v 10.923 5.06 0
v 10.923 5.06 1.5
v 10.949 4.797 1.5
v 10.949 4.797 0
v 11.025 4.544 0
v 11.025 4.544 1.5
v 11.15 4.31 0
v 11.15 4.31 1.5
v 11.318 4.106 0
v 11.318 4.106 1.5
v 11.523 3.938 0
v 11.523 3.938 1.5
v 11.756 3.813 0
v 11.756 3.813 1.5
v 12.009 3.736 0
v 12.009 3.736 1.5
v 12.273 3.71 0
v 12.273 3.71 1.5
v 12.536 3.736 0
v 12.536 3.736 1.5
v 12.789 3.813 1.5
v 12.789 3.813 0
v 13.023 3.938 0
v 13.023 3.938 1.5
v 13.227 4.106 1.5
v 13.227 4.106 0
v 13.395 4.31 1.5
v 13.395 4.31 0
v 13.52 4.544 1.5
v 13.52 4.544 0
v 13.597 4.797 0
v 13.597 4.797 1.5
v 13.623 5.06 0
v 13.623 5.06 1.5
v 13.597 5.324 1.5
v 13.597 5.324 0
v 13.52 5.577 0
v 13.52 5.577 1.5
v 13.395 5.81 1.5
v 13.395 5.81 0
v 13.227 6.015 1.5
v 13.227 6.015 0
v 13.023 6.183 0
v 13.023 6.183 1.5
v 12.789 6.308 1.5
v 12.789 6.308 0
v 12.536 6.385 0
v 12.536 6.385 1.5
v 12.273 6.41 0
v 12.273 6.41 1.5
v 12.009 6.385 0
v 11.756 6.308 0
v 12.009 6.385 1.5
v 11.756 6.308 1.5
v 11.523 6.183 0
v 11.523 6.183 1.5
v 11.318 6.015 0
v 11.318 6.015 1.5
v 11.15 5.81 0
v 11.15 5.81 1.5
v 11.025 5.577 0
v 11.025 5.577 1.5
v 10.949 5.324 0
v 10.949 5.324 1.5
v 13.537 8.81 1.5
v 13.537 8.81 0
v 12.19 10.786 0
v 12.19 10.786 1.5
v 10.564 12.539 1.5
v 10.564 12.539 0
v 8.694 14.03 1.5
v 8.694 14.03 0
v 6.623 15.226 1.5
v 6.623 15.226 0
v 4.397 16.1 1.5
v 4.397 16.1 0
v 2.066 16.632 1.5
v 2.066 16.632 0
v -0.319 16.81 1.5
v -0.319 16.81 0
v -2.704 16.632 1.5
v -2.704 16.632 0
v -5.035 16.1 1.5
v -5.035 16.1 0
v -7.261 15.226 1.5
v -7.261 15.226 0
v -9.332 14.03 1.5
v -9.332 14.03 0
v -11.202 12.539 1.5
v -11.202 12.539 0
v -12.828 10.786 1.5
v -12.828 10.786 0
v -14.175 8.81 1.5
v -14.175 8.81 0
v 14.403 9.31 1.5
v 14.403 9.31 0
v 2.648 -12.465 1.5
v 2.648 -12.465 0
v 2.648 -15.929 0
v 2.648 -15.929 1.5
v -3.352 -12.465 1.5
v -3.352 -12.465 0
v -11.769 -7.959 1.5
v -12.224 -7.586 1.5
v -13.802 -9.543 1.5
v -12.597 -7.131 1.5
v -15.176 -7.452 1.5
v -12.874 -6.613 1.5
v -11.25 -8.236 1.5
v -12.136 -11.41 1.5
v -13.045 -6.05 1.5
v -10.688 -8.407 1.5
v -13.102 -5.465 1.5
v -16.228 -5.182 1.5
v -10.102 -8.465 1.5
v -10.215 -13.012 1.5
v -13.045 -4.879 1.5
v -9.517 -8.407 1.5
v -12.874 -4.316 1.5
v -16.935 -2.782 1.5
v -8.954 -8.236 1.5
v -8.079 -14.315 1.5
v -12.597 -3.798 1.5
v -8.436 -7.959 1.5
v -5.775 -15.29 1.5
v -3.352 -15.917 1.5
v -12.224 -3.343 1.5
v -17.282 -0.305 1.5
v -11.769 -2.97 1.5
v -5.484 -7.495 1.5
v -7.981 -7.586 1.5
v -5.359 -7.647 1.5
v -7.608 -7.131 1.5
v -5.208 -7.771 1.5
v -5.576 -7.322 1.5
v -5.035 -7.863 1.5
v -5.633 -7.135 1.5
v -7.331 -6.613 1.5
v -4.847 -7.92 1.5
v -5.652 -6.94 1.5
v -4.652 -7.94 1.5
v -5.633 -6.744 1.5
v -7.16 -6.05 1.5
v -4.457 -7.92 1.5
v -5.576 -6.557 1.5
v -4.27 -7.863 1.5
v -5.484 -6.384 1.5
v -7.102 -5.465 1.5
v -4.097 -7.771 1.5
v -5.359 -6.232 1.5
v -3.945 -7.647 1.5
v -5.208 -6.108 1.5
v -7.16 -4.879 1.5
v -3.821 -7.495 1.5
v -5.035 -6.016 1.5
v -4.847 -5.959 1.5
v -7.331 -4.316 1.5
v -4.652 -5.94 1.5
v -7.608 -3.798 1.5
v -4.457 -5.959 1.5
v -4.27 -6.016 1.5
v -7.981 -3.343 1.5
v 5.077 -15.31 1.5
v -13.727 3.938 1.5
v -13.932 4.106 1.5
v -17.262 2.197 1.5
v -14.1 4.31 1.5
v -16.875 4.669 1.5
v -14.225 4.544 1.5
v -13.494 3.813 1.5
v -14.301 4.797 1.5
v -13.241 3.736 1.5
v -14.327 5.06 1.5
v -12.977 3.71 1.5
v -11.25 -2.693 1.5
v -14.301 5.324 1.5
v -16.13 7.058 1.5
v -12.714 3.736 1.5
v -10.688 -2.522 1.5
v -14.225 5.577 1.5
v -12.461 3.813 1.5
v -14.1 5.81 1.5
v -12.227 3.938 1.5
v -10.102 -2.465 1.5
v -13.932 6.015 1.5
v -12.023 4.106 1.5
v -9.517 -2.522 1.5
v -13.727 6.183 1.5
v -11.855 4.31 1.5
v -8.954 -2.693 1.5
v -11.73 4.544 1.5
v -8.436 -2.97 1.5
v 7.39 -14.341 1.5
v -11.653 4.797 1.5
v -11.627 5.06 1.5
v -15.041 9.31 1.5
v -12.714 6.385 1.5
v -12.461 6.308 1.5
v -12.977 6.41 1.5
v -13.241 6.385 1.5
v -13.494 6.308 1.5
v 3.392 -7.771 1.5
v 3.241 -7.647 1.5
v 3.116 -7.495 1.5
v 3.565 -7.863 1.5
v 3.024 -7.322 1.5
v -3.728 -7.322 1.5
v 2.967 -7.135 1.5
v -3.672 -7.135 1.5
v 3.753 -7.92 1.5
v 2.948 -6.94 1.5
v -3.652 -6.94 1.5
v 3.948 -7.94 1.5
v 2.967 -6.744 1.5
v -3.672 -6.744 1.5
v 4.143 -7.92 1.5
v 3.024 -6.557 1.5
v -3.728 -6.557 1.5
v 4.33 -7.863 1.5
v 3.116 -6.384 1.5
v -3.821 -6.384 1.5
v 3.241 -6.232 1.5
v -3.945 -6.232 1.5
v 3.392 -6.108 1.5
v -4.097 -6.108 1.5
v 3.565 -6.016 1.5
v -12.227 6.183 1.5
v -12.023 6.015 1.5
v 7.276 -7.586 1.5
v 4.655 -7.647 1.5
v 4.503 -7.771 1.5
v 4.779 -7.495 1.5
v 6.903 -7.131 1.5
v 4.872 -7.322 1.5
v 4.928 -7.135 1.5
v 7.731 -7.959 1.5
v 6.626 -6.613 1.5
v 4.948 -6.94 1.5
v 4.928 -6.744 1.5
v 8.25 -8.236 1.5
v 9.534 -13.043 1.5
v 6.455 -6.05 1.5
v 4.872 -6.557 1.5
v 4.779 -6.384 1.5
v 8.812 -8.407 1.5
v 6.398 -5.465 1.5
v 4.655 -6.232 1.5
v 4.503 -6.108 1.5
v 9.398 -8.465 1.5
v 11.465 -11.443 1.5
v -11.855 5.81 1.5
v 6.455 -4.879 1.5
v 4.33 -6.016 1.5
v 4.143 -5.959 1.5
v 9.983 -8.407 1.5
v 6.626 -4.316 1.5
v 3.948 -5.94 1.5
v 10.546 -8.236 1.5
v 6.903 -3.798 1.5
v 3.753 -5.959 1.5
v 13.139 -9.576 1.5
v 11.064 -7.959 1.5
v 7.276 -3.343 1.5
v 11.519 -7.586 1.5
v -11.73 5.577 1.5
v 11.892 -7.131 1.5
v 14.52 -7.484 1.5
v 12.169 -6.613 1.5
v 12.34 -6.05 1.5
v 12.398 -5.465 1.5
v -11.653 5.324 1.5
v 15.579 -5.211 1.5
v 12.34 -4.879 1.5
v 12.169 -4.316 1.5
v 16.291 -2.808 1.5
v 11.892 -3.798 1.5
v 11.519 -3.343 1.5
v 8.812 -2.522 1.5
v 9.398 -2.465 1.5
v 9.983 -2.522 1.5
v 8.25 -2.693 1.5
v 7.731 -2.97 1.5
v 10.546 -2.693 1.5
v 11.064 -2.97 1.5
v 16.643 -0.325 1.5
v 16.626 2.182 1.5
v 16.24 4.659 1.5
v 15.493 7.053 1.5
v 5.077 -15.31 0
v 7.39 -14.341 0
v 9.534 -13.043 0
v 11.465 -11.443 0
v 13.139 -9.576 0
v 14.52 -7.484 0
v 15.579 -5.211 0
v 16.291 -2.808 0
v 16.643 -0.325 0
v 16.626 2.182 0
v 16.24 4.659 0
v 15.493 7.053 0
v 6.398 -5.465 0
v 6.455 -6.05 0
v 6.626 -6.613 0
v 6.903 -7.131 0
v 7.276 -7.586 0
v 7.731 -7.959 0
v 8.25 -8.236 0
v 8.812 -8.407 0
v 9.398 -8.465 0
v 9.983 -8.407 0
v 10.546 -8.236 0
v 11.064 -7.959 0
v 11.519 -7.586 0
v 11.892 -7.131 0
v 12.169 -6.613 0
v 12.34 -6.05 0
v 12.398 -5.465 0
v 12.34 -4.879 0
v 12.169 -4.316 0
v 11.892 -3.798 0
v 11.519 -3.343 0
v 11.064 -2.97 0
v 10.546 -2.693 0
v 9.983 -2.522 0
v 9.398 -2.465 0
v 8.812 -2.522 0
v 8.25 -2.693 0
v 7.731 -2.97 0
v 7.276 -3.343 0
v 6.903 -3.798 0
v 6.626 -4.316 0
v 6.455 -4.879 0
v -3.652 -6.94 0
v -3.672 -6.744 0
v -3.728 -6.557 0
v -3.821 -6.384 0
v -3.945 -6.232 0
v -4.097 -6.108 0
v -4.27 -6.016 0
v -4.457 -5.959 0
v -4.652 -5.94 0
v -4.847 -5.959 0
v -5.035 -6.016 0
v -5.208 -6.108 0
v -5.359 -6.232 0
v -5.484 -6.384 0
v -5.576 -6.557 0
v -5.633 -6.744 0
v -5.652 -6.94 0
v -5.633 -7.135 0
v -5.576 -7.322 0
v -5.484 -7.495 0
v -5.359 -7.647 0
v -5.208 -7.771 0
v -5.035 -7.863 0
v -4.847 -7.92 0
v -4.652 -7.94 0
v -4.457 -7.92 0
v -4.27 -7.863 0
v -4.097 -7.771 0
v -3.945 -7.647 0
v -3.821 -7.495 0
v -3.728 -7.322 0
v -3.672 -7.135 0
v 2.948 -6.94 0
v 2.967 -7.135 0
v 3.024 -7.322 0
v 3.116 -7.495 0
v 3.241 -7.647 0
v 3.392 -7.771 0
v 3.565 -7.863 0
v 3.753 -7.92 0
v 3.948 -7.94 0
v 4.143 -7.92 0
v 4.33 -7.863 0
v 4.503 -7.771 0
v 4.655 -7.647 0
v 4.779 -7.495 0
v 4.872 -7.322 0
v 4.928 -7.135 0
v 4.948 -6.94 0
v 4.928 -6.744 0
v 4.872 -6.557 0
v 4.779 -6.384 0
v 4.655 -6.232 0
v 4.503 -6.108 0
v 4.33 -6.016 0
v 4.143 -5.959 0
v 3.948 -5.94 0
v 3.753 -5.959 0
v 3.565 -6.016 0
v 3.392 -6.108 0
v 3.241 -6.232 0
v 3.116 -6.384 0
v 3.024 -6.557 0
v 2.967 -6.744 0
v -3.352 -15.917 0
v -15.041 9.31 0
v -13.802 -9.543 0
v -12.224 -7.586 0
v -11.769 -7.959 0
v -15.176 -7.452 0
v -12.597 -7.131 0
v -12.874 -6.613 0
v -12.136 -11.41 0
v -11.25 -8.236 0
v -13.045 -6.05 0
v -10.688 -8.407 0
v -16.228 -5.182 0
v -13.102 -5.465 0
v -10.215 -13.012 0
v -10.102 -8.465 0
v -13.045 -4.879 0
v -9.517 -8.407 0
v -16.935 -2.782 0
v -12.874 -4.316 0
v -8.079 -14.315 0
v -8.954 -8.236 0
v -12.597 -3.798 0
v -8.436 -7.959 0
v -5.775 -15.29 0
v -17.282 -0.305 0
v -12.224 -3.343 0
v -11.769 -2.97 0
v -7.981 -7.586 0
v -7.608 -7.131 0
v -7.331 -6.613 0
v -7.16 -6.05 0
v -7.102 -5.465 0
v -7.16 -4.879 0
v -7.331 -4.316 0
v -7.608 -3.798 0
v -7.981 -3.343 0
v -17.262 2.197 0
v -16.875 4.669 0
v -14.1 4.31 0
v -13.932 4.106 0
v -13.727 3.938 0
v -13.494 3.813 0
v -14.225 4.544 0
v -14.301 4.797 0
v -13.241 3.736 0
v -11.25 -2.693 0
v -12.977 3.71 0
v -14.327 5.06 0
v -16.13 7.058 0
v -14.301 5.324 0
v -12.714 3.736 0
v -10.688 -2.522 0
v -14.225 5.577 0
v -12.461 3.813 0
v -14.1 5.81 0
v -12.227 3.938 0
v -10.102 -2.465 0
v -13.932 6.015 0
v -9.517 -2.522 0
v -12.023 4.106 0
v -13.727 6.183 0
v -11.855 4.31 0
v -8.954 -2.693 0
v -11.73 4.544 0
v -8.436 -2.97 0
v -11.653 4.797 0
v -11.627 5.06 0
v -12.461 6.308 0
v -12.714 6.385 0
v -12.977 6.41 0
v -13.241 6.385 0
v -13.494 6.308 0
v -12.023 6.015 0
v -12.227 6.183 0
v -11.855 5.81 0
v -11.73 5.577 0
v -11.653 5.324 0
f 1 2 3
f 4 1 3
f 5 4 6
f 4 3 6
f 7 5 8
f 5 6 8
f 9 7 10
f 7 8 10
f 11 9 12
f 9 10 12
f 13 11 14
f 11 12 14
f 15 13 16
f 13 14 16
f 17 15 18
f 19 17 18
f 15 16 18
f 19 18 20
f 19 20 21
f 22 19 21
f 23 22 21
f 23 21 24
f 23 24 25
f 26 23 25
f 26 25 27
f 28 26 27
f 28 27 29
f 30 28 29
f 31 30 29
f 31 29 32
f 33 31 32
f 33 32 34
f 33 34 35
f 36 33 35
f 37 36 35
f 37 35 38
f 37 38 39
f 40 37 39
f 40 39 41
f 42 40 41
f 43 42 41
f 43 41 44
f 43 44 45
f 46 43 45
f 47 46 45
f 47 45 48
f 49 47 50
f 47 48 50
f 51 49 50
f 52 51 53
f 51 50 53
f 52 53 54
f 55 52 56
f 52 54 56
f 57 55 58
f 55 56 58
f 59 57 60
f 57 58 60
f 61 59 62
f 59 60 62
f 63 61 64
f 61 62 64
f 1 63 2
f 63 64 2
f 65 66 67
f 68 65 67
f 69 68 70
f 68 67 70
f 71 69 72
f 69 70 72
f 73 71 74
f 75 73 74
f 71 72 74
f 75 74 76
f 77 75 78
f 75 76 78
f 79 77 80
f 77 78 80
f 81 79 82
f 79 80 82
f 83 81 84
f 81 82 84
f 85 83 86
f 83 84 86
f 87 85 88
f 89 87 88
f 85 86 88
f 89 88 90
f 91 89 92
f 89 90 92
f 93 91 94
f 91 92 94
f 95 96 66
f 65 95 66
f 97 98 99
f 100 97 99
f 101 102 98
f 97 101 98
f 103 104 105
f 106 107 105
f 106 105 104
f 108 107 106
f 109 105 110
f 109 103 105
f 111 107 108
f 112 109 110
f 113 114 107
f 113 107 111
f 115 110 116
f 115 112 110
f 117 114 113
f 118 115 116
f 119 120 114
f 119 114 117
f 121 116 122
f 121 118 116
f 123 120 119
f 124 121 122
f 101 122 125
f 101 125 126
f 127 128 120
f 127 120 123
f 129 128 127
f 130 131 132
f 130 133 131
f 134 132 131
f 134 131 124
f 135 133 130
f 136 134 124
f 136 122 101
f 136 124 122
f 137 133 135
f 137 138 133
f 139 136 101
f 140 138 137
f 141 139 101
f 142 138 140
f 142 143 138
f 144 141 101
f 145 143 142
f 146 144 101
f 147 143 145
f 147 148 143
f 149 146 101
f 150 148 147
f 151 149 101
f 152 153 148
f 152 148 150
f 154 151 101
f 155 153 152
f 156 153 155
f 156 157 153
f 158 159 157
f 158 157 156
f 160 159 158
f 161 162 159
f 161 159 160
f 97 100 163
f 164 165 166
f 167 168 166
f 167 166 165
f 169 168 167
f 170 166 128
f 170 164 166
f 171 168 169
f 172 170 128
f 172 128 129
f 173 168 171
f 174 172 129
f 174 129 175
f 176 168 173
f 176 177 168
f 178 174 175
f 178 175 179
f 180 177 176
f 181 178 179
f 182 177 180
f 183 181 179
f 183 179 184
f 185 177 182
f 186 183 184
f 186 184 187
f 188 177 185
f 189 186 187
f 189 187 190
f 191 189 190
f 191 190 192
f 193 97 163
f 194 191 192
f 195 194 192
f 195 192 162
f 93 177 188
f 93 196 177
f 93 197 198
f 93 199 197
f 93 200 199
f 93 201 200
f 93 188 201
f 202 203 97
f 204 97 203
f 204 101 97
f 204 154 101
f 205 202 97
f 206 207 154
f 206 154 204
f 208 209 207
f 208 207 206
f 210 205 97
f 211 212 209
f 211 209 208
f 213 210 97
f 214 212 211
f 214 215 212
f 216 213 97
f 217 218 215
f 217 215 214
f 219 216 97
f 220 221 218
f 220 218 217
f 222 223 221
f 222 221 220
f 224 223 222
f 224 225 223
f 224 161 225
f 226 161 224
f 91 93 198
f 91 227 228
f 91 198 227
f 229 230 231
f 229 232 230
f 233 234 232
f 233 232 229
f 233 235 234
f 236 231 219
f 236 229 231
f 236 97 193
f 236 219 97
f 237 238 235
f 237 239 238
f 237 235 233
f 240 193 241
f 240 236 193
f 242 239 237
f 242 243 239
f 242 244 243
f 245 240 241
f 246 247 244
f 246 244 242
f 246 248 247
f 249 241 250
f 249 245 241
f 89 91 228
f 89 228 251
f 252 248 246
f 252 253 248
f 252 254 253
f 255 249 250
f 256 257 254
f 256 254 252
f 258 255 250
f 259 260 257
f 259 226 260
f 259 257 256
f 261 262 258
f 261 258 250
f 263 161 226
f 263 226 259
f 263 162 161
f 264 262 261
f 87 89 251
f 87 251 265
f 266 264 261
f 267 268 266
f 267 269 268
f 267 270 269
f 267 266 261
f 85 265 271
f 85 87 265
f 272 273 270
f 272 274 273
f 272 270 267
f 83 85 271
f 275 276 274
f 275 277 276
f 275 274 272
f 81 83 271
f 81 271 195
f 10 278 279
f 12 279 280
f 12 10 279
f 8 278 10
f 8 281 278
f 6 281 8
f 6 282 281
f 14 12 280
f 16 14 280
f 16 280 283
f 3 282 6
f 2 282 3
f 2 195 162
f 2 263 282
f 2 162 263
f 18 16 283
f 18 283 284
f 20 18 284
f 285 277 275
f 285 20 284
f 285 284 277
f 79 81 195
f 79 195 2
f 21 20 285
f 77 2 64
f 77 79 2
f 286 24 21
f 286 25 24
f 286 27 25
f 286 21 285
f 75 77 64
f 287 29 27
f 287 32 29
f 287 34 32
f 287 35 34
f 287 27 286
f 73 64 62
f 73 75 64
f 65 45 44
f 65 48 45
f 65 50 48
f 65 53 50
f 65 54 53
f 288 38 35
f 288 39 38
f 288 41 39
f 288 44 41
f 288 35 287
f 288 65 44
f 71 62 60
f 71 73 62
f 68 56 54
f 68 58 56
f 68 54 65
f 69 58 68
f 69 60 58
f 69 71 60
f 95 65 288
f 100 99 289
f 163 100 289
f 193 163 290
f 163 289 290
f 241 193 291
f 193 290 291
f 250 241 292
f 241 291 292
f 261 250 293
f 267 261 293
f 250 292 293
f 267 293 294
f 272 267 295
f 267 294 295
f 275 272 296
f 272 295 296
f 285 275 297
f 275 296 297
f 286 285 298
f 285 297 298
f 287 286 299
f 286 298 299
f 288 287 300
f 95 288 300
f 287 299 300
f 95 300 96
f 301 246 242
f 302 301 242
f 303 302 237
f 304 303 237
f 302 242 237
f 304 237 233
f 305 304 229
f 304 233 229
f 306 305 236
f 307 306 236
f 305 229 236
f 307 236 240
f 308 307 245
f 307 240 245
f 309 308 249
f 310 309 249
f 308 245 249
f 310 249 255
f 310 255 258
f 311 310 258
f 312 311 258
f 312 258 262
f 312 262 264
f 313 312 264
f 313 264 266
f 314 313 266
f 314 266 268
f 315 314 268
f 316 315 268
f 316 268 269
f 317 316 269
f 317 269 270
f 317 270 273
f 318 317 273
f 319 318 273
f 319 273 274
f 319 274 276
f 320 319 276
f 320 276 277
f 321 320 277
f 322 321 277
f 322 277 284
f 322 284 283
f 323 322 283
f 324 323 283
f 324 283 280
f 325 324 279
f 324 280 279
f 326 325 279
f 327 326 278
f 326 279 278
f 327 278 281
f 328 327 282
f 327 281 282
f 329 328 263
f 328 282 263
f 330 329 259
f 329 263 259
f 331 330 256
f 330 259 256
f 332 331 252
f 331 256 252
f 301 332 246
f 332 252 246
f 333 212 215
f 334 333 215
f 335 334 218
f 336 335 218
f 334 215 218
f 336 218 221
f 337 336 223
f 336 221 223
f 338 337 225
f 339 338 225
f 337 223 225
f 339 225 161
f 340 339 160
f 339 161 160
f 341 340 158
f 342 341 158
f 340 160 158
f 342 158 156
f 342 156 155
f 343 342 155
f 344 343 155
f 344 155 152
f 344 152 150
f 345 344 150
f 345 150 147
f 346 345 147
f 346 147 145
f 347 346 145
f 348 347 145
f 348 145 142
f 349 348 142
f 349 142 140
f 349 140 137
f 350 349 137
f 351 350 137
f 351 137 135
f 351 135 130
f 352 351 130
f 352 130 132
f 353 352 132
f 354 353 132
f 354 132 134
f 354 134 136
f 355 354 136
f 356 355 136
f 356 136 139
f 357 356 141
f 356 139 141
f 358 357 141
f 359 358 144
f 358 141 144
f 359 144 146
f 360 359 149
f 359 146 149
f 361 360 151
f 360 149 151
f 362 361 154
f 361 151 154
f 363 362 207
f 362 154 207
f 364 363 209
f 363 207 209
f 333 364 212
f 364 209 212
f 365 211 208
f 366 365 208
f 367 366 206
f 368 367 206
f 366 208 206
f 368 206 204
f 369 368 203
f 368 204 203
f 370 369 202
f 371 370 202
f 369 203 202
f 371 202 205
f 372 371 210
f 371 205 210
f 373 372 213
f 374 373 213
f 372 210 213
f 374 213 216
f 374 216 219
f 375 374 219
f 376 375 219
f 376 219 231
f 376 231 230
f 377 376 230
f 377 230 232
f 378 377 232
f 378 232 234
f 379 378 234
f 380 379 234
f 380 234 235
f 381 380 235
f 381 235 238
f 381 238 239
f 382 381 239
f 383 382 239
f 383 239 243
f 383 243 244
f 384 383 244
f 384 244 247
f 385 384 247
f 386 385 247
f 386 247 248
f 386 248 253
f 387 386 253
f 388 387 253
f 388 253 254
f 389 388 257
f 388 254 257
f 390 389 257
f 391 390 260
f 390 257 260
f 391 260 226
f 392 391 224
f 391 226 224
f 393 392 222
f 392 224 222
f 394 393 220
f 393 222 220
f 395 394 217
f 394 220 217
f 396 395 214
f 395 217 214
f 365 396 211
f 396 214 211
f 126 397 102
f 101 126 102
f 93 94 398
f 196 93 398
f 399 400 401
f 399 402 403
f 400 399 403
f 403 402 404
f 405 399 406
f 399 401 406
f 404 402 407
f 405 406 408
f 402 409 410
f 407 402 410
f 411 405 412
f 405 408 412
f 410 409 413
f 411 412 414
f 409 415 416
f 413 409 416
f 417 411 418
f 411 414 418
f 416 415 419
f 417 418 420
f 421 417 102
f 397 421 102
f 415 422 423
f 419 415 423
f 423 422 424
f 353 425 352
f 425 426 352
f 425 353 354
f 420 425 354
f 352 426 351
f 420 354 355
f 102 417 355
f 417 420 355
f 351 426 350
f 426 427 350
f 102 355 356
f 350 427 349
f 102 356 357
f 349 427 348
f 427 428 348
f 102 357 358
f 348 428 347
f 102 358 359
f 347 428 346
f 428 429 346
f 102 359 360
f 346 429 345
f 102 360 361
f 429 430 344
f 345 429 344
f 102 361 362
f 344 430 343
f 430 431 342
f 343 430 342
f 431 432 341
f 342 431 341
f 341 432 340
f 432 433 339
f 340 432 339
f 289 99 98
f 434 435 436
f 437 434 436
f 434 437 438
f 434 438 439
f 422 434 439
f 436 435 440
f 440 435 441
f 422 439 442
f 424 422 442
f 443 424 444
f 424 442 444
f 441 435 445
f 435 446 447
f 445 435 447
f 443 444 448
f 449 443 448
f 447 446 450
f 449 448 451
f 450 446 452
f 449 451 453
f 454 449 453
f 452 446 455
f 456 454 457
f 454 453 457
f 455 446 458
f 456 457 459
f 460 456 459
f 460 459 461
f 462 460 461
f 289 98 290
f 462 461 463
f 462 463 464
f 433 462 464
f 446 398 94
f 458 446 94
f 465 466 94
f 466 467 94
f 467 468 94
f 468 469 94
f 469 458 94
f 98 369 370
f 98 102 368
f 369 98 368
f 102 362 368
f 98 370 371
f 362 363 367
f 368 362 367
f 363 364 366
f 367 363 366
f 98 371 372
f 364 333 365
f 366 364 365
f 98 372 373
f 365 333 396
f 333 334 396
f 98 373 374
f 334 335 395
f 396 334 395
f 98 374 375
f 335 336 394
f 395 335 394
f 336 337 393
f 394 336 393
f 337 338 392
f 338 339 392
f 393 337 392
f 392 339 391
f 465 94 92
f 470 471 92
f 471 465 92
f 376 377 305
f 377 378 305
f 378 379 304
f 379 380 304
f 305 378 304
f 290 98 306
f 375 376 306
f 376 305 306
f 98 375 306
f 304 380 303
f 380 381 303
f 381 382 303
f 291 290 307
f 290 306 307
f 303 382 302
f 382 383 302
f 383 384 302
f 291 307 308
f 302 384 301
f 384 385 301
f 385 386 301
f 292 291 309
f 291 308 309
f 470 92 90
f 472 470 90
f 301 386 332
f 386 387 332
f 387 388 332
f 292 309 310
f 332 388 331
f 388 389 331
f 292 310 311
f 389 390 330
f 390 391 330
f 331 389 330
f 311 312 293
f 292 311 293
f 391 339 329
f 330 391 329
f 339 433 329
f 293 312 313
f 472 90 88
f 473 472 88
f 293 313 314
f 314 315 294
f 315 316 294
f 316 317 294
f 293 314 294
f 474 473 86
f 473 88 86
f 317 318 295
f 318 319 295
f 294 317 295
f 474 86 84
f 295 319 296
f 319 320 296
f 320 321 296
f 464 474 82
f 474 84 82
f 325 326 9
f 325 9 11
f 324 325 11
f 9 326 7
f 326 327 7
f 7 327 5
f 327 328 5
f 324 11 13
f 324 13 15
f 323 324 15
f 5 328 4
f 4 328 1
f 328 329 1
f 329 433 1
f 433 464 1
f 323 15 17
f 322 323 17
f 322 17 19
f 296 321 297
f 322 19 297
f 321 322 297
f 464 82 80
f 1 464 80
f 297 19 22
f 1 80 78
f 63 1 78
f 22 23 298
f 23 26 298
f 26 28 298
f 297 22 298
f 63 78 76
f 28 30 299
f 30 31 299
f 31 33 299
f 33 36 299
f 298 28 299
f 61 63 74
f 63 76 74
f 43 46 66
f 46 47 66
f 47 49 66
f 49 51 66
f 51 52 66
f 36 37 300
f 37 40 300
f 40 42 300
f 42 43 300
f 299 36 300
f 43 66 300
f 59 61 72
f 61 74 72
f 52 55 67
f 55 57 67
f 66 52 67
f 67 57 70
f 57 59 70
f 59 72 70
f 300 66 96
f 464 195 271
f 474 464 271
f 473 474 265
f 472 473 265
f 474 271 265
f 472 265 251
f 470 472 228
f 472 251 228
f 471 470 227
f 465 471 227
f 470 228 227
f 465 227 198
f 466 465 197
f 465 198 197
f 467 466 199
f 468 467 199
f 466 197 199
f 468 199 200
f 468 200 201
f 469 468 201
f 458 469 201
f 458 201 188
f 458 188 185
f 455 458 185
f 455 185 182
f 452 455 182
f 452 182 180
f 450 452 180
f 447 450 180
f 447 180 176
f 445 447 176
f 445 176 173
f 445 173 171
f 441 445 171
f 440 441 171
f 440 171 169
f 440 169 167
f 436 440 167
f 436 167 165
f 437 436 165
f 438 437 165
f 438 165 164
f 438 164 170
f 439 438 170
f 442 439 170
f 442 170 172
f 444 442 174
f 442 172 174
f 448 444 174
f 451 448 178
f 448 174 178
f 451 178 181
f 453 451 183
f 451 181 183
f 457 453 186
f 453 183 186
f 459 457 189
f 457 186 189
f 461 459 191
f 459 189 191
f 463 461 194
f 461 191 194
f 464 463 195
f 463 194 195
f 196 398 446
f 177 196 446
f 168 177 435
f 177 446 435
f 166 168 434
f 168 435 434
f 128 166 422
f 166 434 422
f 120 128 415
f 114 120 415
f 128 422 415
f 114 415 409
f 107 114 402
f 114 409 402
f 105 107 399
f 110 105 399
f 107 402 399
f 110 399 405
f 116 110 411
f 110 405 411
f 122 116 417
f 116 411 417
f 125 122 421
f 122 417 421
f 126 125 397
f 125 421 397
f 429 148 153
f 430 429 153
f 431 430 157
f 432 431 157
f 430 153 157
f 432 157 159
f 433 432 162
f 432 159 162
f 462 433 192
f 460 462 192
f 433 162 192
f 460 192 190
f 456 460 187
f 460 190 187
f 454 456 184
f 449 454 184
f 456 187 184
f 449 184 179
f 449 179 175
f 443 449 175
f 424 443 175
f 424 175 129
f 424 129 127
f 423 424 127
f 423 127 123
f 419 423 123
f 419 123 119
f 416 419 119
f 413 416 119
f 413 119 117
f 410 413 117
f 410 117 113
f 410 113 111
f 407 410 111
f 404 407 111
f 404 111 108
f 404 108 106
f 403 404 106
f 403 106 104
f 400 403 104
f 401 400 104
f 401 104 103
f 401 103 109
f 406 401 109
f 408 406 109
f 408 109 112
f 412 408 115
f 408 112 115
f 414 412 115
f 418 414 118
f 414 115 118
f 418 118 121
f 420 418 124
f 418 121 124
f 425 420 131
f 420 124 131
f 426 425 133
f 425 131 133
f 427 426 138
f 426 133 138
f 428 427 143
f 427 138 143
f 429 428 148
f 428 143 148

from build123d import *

# Parameters (mm, degrees)
BOSS_EXTRUDE1_DEPTH = 1.5
SKETCH2_R           = 3
SKETCH2_R_2         = 1.35
SKETCH2_R_3         = 1
CUT_EXTRUDE1_DEPTH  = 25.182451908


with BuildPart() as part:
    # Sketch1 → Boss-Extrude1 (new body)
    with BuildSketch(Plane.XY):
        with BuildLine():
            Line((-3.352285907, -12.464521672), (2.647714093, -12.464521672))
            Line((2.647714093, -12.464521672), (2.647714093, -15.928650375))
            ThreePointArc((2.647714093, -15.928650375), (15.091360711, -6.367255259), (14.403401907, 9.310478328))
            Line((14.403401907, 9.310478328), (13.537376503, 8.810478328))
            ThreePointArc((13.537376503, 8.810478328), (-0.319029957, 16.810478328), (-14.175436418, 8.810478328))
            Line((-14.175436418, 8.810478328), (-15.041461822, 9.310478328))
            ThreePointArc((-15.041461822, 9.310478328), (-15.743655386, -6.336614115), (-3.352285907, -15.916725812))
            Line((-3.352285907, -15.916725812), (-3.352285907, -12.464521672))
        make_face()
    extrude(amount=BOSS_EXTRUDE1_DEPTH)

    # Sketch2 → Cut-Extrude1 (cut, through all)
    with BuildSketch(Plane.XY.offset(1.5)):
        with Locations((-10.102285907, -5.464521672)):
            Circle(SKETCH2_R)
        with Locations(Location((9.397714093, -5.464521672, 0), (0, 0, 180))):
            Circle(SKETCH2_R)
        with Locations((-12.977285907, 5.060478328)):
            Circle(SKETCH2_R_2)
        with Locations(Location((12.272714093, 5.060478328, 0), (0, 0, 180))):
            Circle(SKETCH2_R_2)
        with Locations((-4.652285907, -6.939521672)):
            Circle(SKETCH2_R_3)
        with Locations(Location((3.947714093, -6.939521672, 0), (0, 0, 180))):
            Circle(SKETCH2_R_3)
    extrude(amount=-CUT_EXTRUDE1_DEPTH, mode=Mode.SUBTRACT)


solid = part.part
